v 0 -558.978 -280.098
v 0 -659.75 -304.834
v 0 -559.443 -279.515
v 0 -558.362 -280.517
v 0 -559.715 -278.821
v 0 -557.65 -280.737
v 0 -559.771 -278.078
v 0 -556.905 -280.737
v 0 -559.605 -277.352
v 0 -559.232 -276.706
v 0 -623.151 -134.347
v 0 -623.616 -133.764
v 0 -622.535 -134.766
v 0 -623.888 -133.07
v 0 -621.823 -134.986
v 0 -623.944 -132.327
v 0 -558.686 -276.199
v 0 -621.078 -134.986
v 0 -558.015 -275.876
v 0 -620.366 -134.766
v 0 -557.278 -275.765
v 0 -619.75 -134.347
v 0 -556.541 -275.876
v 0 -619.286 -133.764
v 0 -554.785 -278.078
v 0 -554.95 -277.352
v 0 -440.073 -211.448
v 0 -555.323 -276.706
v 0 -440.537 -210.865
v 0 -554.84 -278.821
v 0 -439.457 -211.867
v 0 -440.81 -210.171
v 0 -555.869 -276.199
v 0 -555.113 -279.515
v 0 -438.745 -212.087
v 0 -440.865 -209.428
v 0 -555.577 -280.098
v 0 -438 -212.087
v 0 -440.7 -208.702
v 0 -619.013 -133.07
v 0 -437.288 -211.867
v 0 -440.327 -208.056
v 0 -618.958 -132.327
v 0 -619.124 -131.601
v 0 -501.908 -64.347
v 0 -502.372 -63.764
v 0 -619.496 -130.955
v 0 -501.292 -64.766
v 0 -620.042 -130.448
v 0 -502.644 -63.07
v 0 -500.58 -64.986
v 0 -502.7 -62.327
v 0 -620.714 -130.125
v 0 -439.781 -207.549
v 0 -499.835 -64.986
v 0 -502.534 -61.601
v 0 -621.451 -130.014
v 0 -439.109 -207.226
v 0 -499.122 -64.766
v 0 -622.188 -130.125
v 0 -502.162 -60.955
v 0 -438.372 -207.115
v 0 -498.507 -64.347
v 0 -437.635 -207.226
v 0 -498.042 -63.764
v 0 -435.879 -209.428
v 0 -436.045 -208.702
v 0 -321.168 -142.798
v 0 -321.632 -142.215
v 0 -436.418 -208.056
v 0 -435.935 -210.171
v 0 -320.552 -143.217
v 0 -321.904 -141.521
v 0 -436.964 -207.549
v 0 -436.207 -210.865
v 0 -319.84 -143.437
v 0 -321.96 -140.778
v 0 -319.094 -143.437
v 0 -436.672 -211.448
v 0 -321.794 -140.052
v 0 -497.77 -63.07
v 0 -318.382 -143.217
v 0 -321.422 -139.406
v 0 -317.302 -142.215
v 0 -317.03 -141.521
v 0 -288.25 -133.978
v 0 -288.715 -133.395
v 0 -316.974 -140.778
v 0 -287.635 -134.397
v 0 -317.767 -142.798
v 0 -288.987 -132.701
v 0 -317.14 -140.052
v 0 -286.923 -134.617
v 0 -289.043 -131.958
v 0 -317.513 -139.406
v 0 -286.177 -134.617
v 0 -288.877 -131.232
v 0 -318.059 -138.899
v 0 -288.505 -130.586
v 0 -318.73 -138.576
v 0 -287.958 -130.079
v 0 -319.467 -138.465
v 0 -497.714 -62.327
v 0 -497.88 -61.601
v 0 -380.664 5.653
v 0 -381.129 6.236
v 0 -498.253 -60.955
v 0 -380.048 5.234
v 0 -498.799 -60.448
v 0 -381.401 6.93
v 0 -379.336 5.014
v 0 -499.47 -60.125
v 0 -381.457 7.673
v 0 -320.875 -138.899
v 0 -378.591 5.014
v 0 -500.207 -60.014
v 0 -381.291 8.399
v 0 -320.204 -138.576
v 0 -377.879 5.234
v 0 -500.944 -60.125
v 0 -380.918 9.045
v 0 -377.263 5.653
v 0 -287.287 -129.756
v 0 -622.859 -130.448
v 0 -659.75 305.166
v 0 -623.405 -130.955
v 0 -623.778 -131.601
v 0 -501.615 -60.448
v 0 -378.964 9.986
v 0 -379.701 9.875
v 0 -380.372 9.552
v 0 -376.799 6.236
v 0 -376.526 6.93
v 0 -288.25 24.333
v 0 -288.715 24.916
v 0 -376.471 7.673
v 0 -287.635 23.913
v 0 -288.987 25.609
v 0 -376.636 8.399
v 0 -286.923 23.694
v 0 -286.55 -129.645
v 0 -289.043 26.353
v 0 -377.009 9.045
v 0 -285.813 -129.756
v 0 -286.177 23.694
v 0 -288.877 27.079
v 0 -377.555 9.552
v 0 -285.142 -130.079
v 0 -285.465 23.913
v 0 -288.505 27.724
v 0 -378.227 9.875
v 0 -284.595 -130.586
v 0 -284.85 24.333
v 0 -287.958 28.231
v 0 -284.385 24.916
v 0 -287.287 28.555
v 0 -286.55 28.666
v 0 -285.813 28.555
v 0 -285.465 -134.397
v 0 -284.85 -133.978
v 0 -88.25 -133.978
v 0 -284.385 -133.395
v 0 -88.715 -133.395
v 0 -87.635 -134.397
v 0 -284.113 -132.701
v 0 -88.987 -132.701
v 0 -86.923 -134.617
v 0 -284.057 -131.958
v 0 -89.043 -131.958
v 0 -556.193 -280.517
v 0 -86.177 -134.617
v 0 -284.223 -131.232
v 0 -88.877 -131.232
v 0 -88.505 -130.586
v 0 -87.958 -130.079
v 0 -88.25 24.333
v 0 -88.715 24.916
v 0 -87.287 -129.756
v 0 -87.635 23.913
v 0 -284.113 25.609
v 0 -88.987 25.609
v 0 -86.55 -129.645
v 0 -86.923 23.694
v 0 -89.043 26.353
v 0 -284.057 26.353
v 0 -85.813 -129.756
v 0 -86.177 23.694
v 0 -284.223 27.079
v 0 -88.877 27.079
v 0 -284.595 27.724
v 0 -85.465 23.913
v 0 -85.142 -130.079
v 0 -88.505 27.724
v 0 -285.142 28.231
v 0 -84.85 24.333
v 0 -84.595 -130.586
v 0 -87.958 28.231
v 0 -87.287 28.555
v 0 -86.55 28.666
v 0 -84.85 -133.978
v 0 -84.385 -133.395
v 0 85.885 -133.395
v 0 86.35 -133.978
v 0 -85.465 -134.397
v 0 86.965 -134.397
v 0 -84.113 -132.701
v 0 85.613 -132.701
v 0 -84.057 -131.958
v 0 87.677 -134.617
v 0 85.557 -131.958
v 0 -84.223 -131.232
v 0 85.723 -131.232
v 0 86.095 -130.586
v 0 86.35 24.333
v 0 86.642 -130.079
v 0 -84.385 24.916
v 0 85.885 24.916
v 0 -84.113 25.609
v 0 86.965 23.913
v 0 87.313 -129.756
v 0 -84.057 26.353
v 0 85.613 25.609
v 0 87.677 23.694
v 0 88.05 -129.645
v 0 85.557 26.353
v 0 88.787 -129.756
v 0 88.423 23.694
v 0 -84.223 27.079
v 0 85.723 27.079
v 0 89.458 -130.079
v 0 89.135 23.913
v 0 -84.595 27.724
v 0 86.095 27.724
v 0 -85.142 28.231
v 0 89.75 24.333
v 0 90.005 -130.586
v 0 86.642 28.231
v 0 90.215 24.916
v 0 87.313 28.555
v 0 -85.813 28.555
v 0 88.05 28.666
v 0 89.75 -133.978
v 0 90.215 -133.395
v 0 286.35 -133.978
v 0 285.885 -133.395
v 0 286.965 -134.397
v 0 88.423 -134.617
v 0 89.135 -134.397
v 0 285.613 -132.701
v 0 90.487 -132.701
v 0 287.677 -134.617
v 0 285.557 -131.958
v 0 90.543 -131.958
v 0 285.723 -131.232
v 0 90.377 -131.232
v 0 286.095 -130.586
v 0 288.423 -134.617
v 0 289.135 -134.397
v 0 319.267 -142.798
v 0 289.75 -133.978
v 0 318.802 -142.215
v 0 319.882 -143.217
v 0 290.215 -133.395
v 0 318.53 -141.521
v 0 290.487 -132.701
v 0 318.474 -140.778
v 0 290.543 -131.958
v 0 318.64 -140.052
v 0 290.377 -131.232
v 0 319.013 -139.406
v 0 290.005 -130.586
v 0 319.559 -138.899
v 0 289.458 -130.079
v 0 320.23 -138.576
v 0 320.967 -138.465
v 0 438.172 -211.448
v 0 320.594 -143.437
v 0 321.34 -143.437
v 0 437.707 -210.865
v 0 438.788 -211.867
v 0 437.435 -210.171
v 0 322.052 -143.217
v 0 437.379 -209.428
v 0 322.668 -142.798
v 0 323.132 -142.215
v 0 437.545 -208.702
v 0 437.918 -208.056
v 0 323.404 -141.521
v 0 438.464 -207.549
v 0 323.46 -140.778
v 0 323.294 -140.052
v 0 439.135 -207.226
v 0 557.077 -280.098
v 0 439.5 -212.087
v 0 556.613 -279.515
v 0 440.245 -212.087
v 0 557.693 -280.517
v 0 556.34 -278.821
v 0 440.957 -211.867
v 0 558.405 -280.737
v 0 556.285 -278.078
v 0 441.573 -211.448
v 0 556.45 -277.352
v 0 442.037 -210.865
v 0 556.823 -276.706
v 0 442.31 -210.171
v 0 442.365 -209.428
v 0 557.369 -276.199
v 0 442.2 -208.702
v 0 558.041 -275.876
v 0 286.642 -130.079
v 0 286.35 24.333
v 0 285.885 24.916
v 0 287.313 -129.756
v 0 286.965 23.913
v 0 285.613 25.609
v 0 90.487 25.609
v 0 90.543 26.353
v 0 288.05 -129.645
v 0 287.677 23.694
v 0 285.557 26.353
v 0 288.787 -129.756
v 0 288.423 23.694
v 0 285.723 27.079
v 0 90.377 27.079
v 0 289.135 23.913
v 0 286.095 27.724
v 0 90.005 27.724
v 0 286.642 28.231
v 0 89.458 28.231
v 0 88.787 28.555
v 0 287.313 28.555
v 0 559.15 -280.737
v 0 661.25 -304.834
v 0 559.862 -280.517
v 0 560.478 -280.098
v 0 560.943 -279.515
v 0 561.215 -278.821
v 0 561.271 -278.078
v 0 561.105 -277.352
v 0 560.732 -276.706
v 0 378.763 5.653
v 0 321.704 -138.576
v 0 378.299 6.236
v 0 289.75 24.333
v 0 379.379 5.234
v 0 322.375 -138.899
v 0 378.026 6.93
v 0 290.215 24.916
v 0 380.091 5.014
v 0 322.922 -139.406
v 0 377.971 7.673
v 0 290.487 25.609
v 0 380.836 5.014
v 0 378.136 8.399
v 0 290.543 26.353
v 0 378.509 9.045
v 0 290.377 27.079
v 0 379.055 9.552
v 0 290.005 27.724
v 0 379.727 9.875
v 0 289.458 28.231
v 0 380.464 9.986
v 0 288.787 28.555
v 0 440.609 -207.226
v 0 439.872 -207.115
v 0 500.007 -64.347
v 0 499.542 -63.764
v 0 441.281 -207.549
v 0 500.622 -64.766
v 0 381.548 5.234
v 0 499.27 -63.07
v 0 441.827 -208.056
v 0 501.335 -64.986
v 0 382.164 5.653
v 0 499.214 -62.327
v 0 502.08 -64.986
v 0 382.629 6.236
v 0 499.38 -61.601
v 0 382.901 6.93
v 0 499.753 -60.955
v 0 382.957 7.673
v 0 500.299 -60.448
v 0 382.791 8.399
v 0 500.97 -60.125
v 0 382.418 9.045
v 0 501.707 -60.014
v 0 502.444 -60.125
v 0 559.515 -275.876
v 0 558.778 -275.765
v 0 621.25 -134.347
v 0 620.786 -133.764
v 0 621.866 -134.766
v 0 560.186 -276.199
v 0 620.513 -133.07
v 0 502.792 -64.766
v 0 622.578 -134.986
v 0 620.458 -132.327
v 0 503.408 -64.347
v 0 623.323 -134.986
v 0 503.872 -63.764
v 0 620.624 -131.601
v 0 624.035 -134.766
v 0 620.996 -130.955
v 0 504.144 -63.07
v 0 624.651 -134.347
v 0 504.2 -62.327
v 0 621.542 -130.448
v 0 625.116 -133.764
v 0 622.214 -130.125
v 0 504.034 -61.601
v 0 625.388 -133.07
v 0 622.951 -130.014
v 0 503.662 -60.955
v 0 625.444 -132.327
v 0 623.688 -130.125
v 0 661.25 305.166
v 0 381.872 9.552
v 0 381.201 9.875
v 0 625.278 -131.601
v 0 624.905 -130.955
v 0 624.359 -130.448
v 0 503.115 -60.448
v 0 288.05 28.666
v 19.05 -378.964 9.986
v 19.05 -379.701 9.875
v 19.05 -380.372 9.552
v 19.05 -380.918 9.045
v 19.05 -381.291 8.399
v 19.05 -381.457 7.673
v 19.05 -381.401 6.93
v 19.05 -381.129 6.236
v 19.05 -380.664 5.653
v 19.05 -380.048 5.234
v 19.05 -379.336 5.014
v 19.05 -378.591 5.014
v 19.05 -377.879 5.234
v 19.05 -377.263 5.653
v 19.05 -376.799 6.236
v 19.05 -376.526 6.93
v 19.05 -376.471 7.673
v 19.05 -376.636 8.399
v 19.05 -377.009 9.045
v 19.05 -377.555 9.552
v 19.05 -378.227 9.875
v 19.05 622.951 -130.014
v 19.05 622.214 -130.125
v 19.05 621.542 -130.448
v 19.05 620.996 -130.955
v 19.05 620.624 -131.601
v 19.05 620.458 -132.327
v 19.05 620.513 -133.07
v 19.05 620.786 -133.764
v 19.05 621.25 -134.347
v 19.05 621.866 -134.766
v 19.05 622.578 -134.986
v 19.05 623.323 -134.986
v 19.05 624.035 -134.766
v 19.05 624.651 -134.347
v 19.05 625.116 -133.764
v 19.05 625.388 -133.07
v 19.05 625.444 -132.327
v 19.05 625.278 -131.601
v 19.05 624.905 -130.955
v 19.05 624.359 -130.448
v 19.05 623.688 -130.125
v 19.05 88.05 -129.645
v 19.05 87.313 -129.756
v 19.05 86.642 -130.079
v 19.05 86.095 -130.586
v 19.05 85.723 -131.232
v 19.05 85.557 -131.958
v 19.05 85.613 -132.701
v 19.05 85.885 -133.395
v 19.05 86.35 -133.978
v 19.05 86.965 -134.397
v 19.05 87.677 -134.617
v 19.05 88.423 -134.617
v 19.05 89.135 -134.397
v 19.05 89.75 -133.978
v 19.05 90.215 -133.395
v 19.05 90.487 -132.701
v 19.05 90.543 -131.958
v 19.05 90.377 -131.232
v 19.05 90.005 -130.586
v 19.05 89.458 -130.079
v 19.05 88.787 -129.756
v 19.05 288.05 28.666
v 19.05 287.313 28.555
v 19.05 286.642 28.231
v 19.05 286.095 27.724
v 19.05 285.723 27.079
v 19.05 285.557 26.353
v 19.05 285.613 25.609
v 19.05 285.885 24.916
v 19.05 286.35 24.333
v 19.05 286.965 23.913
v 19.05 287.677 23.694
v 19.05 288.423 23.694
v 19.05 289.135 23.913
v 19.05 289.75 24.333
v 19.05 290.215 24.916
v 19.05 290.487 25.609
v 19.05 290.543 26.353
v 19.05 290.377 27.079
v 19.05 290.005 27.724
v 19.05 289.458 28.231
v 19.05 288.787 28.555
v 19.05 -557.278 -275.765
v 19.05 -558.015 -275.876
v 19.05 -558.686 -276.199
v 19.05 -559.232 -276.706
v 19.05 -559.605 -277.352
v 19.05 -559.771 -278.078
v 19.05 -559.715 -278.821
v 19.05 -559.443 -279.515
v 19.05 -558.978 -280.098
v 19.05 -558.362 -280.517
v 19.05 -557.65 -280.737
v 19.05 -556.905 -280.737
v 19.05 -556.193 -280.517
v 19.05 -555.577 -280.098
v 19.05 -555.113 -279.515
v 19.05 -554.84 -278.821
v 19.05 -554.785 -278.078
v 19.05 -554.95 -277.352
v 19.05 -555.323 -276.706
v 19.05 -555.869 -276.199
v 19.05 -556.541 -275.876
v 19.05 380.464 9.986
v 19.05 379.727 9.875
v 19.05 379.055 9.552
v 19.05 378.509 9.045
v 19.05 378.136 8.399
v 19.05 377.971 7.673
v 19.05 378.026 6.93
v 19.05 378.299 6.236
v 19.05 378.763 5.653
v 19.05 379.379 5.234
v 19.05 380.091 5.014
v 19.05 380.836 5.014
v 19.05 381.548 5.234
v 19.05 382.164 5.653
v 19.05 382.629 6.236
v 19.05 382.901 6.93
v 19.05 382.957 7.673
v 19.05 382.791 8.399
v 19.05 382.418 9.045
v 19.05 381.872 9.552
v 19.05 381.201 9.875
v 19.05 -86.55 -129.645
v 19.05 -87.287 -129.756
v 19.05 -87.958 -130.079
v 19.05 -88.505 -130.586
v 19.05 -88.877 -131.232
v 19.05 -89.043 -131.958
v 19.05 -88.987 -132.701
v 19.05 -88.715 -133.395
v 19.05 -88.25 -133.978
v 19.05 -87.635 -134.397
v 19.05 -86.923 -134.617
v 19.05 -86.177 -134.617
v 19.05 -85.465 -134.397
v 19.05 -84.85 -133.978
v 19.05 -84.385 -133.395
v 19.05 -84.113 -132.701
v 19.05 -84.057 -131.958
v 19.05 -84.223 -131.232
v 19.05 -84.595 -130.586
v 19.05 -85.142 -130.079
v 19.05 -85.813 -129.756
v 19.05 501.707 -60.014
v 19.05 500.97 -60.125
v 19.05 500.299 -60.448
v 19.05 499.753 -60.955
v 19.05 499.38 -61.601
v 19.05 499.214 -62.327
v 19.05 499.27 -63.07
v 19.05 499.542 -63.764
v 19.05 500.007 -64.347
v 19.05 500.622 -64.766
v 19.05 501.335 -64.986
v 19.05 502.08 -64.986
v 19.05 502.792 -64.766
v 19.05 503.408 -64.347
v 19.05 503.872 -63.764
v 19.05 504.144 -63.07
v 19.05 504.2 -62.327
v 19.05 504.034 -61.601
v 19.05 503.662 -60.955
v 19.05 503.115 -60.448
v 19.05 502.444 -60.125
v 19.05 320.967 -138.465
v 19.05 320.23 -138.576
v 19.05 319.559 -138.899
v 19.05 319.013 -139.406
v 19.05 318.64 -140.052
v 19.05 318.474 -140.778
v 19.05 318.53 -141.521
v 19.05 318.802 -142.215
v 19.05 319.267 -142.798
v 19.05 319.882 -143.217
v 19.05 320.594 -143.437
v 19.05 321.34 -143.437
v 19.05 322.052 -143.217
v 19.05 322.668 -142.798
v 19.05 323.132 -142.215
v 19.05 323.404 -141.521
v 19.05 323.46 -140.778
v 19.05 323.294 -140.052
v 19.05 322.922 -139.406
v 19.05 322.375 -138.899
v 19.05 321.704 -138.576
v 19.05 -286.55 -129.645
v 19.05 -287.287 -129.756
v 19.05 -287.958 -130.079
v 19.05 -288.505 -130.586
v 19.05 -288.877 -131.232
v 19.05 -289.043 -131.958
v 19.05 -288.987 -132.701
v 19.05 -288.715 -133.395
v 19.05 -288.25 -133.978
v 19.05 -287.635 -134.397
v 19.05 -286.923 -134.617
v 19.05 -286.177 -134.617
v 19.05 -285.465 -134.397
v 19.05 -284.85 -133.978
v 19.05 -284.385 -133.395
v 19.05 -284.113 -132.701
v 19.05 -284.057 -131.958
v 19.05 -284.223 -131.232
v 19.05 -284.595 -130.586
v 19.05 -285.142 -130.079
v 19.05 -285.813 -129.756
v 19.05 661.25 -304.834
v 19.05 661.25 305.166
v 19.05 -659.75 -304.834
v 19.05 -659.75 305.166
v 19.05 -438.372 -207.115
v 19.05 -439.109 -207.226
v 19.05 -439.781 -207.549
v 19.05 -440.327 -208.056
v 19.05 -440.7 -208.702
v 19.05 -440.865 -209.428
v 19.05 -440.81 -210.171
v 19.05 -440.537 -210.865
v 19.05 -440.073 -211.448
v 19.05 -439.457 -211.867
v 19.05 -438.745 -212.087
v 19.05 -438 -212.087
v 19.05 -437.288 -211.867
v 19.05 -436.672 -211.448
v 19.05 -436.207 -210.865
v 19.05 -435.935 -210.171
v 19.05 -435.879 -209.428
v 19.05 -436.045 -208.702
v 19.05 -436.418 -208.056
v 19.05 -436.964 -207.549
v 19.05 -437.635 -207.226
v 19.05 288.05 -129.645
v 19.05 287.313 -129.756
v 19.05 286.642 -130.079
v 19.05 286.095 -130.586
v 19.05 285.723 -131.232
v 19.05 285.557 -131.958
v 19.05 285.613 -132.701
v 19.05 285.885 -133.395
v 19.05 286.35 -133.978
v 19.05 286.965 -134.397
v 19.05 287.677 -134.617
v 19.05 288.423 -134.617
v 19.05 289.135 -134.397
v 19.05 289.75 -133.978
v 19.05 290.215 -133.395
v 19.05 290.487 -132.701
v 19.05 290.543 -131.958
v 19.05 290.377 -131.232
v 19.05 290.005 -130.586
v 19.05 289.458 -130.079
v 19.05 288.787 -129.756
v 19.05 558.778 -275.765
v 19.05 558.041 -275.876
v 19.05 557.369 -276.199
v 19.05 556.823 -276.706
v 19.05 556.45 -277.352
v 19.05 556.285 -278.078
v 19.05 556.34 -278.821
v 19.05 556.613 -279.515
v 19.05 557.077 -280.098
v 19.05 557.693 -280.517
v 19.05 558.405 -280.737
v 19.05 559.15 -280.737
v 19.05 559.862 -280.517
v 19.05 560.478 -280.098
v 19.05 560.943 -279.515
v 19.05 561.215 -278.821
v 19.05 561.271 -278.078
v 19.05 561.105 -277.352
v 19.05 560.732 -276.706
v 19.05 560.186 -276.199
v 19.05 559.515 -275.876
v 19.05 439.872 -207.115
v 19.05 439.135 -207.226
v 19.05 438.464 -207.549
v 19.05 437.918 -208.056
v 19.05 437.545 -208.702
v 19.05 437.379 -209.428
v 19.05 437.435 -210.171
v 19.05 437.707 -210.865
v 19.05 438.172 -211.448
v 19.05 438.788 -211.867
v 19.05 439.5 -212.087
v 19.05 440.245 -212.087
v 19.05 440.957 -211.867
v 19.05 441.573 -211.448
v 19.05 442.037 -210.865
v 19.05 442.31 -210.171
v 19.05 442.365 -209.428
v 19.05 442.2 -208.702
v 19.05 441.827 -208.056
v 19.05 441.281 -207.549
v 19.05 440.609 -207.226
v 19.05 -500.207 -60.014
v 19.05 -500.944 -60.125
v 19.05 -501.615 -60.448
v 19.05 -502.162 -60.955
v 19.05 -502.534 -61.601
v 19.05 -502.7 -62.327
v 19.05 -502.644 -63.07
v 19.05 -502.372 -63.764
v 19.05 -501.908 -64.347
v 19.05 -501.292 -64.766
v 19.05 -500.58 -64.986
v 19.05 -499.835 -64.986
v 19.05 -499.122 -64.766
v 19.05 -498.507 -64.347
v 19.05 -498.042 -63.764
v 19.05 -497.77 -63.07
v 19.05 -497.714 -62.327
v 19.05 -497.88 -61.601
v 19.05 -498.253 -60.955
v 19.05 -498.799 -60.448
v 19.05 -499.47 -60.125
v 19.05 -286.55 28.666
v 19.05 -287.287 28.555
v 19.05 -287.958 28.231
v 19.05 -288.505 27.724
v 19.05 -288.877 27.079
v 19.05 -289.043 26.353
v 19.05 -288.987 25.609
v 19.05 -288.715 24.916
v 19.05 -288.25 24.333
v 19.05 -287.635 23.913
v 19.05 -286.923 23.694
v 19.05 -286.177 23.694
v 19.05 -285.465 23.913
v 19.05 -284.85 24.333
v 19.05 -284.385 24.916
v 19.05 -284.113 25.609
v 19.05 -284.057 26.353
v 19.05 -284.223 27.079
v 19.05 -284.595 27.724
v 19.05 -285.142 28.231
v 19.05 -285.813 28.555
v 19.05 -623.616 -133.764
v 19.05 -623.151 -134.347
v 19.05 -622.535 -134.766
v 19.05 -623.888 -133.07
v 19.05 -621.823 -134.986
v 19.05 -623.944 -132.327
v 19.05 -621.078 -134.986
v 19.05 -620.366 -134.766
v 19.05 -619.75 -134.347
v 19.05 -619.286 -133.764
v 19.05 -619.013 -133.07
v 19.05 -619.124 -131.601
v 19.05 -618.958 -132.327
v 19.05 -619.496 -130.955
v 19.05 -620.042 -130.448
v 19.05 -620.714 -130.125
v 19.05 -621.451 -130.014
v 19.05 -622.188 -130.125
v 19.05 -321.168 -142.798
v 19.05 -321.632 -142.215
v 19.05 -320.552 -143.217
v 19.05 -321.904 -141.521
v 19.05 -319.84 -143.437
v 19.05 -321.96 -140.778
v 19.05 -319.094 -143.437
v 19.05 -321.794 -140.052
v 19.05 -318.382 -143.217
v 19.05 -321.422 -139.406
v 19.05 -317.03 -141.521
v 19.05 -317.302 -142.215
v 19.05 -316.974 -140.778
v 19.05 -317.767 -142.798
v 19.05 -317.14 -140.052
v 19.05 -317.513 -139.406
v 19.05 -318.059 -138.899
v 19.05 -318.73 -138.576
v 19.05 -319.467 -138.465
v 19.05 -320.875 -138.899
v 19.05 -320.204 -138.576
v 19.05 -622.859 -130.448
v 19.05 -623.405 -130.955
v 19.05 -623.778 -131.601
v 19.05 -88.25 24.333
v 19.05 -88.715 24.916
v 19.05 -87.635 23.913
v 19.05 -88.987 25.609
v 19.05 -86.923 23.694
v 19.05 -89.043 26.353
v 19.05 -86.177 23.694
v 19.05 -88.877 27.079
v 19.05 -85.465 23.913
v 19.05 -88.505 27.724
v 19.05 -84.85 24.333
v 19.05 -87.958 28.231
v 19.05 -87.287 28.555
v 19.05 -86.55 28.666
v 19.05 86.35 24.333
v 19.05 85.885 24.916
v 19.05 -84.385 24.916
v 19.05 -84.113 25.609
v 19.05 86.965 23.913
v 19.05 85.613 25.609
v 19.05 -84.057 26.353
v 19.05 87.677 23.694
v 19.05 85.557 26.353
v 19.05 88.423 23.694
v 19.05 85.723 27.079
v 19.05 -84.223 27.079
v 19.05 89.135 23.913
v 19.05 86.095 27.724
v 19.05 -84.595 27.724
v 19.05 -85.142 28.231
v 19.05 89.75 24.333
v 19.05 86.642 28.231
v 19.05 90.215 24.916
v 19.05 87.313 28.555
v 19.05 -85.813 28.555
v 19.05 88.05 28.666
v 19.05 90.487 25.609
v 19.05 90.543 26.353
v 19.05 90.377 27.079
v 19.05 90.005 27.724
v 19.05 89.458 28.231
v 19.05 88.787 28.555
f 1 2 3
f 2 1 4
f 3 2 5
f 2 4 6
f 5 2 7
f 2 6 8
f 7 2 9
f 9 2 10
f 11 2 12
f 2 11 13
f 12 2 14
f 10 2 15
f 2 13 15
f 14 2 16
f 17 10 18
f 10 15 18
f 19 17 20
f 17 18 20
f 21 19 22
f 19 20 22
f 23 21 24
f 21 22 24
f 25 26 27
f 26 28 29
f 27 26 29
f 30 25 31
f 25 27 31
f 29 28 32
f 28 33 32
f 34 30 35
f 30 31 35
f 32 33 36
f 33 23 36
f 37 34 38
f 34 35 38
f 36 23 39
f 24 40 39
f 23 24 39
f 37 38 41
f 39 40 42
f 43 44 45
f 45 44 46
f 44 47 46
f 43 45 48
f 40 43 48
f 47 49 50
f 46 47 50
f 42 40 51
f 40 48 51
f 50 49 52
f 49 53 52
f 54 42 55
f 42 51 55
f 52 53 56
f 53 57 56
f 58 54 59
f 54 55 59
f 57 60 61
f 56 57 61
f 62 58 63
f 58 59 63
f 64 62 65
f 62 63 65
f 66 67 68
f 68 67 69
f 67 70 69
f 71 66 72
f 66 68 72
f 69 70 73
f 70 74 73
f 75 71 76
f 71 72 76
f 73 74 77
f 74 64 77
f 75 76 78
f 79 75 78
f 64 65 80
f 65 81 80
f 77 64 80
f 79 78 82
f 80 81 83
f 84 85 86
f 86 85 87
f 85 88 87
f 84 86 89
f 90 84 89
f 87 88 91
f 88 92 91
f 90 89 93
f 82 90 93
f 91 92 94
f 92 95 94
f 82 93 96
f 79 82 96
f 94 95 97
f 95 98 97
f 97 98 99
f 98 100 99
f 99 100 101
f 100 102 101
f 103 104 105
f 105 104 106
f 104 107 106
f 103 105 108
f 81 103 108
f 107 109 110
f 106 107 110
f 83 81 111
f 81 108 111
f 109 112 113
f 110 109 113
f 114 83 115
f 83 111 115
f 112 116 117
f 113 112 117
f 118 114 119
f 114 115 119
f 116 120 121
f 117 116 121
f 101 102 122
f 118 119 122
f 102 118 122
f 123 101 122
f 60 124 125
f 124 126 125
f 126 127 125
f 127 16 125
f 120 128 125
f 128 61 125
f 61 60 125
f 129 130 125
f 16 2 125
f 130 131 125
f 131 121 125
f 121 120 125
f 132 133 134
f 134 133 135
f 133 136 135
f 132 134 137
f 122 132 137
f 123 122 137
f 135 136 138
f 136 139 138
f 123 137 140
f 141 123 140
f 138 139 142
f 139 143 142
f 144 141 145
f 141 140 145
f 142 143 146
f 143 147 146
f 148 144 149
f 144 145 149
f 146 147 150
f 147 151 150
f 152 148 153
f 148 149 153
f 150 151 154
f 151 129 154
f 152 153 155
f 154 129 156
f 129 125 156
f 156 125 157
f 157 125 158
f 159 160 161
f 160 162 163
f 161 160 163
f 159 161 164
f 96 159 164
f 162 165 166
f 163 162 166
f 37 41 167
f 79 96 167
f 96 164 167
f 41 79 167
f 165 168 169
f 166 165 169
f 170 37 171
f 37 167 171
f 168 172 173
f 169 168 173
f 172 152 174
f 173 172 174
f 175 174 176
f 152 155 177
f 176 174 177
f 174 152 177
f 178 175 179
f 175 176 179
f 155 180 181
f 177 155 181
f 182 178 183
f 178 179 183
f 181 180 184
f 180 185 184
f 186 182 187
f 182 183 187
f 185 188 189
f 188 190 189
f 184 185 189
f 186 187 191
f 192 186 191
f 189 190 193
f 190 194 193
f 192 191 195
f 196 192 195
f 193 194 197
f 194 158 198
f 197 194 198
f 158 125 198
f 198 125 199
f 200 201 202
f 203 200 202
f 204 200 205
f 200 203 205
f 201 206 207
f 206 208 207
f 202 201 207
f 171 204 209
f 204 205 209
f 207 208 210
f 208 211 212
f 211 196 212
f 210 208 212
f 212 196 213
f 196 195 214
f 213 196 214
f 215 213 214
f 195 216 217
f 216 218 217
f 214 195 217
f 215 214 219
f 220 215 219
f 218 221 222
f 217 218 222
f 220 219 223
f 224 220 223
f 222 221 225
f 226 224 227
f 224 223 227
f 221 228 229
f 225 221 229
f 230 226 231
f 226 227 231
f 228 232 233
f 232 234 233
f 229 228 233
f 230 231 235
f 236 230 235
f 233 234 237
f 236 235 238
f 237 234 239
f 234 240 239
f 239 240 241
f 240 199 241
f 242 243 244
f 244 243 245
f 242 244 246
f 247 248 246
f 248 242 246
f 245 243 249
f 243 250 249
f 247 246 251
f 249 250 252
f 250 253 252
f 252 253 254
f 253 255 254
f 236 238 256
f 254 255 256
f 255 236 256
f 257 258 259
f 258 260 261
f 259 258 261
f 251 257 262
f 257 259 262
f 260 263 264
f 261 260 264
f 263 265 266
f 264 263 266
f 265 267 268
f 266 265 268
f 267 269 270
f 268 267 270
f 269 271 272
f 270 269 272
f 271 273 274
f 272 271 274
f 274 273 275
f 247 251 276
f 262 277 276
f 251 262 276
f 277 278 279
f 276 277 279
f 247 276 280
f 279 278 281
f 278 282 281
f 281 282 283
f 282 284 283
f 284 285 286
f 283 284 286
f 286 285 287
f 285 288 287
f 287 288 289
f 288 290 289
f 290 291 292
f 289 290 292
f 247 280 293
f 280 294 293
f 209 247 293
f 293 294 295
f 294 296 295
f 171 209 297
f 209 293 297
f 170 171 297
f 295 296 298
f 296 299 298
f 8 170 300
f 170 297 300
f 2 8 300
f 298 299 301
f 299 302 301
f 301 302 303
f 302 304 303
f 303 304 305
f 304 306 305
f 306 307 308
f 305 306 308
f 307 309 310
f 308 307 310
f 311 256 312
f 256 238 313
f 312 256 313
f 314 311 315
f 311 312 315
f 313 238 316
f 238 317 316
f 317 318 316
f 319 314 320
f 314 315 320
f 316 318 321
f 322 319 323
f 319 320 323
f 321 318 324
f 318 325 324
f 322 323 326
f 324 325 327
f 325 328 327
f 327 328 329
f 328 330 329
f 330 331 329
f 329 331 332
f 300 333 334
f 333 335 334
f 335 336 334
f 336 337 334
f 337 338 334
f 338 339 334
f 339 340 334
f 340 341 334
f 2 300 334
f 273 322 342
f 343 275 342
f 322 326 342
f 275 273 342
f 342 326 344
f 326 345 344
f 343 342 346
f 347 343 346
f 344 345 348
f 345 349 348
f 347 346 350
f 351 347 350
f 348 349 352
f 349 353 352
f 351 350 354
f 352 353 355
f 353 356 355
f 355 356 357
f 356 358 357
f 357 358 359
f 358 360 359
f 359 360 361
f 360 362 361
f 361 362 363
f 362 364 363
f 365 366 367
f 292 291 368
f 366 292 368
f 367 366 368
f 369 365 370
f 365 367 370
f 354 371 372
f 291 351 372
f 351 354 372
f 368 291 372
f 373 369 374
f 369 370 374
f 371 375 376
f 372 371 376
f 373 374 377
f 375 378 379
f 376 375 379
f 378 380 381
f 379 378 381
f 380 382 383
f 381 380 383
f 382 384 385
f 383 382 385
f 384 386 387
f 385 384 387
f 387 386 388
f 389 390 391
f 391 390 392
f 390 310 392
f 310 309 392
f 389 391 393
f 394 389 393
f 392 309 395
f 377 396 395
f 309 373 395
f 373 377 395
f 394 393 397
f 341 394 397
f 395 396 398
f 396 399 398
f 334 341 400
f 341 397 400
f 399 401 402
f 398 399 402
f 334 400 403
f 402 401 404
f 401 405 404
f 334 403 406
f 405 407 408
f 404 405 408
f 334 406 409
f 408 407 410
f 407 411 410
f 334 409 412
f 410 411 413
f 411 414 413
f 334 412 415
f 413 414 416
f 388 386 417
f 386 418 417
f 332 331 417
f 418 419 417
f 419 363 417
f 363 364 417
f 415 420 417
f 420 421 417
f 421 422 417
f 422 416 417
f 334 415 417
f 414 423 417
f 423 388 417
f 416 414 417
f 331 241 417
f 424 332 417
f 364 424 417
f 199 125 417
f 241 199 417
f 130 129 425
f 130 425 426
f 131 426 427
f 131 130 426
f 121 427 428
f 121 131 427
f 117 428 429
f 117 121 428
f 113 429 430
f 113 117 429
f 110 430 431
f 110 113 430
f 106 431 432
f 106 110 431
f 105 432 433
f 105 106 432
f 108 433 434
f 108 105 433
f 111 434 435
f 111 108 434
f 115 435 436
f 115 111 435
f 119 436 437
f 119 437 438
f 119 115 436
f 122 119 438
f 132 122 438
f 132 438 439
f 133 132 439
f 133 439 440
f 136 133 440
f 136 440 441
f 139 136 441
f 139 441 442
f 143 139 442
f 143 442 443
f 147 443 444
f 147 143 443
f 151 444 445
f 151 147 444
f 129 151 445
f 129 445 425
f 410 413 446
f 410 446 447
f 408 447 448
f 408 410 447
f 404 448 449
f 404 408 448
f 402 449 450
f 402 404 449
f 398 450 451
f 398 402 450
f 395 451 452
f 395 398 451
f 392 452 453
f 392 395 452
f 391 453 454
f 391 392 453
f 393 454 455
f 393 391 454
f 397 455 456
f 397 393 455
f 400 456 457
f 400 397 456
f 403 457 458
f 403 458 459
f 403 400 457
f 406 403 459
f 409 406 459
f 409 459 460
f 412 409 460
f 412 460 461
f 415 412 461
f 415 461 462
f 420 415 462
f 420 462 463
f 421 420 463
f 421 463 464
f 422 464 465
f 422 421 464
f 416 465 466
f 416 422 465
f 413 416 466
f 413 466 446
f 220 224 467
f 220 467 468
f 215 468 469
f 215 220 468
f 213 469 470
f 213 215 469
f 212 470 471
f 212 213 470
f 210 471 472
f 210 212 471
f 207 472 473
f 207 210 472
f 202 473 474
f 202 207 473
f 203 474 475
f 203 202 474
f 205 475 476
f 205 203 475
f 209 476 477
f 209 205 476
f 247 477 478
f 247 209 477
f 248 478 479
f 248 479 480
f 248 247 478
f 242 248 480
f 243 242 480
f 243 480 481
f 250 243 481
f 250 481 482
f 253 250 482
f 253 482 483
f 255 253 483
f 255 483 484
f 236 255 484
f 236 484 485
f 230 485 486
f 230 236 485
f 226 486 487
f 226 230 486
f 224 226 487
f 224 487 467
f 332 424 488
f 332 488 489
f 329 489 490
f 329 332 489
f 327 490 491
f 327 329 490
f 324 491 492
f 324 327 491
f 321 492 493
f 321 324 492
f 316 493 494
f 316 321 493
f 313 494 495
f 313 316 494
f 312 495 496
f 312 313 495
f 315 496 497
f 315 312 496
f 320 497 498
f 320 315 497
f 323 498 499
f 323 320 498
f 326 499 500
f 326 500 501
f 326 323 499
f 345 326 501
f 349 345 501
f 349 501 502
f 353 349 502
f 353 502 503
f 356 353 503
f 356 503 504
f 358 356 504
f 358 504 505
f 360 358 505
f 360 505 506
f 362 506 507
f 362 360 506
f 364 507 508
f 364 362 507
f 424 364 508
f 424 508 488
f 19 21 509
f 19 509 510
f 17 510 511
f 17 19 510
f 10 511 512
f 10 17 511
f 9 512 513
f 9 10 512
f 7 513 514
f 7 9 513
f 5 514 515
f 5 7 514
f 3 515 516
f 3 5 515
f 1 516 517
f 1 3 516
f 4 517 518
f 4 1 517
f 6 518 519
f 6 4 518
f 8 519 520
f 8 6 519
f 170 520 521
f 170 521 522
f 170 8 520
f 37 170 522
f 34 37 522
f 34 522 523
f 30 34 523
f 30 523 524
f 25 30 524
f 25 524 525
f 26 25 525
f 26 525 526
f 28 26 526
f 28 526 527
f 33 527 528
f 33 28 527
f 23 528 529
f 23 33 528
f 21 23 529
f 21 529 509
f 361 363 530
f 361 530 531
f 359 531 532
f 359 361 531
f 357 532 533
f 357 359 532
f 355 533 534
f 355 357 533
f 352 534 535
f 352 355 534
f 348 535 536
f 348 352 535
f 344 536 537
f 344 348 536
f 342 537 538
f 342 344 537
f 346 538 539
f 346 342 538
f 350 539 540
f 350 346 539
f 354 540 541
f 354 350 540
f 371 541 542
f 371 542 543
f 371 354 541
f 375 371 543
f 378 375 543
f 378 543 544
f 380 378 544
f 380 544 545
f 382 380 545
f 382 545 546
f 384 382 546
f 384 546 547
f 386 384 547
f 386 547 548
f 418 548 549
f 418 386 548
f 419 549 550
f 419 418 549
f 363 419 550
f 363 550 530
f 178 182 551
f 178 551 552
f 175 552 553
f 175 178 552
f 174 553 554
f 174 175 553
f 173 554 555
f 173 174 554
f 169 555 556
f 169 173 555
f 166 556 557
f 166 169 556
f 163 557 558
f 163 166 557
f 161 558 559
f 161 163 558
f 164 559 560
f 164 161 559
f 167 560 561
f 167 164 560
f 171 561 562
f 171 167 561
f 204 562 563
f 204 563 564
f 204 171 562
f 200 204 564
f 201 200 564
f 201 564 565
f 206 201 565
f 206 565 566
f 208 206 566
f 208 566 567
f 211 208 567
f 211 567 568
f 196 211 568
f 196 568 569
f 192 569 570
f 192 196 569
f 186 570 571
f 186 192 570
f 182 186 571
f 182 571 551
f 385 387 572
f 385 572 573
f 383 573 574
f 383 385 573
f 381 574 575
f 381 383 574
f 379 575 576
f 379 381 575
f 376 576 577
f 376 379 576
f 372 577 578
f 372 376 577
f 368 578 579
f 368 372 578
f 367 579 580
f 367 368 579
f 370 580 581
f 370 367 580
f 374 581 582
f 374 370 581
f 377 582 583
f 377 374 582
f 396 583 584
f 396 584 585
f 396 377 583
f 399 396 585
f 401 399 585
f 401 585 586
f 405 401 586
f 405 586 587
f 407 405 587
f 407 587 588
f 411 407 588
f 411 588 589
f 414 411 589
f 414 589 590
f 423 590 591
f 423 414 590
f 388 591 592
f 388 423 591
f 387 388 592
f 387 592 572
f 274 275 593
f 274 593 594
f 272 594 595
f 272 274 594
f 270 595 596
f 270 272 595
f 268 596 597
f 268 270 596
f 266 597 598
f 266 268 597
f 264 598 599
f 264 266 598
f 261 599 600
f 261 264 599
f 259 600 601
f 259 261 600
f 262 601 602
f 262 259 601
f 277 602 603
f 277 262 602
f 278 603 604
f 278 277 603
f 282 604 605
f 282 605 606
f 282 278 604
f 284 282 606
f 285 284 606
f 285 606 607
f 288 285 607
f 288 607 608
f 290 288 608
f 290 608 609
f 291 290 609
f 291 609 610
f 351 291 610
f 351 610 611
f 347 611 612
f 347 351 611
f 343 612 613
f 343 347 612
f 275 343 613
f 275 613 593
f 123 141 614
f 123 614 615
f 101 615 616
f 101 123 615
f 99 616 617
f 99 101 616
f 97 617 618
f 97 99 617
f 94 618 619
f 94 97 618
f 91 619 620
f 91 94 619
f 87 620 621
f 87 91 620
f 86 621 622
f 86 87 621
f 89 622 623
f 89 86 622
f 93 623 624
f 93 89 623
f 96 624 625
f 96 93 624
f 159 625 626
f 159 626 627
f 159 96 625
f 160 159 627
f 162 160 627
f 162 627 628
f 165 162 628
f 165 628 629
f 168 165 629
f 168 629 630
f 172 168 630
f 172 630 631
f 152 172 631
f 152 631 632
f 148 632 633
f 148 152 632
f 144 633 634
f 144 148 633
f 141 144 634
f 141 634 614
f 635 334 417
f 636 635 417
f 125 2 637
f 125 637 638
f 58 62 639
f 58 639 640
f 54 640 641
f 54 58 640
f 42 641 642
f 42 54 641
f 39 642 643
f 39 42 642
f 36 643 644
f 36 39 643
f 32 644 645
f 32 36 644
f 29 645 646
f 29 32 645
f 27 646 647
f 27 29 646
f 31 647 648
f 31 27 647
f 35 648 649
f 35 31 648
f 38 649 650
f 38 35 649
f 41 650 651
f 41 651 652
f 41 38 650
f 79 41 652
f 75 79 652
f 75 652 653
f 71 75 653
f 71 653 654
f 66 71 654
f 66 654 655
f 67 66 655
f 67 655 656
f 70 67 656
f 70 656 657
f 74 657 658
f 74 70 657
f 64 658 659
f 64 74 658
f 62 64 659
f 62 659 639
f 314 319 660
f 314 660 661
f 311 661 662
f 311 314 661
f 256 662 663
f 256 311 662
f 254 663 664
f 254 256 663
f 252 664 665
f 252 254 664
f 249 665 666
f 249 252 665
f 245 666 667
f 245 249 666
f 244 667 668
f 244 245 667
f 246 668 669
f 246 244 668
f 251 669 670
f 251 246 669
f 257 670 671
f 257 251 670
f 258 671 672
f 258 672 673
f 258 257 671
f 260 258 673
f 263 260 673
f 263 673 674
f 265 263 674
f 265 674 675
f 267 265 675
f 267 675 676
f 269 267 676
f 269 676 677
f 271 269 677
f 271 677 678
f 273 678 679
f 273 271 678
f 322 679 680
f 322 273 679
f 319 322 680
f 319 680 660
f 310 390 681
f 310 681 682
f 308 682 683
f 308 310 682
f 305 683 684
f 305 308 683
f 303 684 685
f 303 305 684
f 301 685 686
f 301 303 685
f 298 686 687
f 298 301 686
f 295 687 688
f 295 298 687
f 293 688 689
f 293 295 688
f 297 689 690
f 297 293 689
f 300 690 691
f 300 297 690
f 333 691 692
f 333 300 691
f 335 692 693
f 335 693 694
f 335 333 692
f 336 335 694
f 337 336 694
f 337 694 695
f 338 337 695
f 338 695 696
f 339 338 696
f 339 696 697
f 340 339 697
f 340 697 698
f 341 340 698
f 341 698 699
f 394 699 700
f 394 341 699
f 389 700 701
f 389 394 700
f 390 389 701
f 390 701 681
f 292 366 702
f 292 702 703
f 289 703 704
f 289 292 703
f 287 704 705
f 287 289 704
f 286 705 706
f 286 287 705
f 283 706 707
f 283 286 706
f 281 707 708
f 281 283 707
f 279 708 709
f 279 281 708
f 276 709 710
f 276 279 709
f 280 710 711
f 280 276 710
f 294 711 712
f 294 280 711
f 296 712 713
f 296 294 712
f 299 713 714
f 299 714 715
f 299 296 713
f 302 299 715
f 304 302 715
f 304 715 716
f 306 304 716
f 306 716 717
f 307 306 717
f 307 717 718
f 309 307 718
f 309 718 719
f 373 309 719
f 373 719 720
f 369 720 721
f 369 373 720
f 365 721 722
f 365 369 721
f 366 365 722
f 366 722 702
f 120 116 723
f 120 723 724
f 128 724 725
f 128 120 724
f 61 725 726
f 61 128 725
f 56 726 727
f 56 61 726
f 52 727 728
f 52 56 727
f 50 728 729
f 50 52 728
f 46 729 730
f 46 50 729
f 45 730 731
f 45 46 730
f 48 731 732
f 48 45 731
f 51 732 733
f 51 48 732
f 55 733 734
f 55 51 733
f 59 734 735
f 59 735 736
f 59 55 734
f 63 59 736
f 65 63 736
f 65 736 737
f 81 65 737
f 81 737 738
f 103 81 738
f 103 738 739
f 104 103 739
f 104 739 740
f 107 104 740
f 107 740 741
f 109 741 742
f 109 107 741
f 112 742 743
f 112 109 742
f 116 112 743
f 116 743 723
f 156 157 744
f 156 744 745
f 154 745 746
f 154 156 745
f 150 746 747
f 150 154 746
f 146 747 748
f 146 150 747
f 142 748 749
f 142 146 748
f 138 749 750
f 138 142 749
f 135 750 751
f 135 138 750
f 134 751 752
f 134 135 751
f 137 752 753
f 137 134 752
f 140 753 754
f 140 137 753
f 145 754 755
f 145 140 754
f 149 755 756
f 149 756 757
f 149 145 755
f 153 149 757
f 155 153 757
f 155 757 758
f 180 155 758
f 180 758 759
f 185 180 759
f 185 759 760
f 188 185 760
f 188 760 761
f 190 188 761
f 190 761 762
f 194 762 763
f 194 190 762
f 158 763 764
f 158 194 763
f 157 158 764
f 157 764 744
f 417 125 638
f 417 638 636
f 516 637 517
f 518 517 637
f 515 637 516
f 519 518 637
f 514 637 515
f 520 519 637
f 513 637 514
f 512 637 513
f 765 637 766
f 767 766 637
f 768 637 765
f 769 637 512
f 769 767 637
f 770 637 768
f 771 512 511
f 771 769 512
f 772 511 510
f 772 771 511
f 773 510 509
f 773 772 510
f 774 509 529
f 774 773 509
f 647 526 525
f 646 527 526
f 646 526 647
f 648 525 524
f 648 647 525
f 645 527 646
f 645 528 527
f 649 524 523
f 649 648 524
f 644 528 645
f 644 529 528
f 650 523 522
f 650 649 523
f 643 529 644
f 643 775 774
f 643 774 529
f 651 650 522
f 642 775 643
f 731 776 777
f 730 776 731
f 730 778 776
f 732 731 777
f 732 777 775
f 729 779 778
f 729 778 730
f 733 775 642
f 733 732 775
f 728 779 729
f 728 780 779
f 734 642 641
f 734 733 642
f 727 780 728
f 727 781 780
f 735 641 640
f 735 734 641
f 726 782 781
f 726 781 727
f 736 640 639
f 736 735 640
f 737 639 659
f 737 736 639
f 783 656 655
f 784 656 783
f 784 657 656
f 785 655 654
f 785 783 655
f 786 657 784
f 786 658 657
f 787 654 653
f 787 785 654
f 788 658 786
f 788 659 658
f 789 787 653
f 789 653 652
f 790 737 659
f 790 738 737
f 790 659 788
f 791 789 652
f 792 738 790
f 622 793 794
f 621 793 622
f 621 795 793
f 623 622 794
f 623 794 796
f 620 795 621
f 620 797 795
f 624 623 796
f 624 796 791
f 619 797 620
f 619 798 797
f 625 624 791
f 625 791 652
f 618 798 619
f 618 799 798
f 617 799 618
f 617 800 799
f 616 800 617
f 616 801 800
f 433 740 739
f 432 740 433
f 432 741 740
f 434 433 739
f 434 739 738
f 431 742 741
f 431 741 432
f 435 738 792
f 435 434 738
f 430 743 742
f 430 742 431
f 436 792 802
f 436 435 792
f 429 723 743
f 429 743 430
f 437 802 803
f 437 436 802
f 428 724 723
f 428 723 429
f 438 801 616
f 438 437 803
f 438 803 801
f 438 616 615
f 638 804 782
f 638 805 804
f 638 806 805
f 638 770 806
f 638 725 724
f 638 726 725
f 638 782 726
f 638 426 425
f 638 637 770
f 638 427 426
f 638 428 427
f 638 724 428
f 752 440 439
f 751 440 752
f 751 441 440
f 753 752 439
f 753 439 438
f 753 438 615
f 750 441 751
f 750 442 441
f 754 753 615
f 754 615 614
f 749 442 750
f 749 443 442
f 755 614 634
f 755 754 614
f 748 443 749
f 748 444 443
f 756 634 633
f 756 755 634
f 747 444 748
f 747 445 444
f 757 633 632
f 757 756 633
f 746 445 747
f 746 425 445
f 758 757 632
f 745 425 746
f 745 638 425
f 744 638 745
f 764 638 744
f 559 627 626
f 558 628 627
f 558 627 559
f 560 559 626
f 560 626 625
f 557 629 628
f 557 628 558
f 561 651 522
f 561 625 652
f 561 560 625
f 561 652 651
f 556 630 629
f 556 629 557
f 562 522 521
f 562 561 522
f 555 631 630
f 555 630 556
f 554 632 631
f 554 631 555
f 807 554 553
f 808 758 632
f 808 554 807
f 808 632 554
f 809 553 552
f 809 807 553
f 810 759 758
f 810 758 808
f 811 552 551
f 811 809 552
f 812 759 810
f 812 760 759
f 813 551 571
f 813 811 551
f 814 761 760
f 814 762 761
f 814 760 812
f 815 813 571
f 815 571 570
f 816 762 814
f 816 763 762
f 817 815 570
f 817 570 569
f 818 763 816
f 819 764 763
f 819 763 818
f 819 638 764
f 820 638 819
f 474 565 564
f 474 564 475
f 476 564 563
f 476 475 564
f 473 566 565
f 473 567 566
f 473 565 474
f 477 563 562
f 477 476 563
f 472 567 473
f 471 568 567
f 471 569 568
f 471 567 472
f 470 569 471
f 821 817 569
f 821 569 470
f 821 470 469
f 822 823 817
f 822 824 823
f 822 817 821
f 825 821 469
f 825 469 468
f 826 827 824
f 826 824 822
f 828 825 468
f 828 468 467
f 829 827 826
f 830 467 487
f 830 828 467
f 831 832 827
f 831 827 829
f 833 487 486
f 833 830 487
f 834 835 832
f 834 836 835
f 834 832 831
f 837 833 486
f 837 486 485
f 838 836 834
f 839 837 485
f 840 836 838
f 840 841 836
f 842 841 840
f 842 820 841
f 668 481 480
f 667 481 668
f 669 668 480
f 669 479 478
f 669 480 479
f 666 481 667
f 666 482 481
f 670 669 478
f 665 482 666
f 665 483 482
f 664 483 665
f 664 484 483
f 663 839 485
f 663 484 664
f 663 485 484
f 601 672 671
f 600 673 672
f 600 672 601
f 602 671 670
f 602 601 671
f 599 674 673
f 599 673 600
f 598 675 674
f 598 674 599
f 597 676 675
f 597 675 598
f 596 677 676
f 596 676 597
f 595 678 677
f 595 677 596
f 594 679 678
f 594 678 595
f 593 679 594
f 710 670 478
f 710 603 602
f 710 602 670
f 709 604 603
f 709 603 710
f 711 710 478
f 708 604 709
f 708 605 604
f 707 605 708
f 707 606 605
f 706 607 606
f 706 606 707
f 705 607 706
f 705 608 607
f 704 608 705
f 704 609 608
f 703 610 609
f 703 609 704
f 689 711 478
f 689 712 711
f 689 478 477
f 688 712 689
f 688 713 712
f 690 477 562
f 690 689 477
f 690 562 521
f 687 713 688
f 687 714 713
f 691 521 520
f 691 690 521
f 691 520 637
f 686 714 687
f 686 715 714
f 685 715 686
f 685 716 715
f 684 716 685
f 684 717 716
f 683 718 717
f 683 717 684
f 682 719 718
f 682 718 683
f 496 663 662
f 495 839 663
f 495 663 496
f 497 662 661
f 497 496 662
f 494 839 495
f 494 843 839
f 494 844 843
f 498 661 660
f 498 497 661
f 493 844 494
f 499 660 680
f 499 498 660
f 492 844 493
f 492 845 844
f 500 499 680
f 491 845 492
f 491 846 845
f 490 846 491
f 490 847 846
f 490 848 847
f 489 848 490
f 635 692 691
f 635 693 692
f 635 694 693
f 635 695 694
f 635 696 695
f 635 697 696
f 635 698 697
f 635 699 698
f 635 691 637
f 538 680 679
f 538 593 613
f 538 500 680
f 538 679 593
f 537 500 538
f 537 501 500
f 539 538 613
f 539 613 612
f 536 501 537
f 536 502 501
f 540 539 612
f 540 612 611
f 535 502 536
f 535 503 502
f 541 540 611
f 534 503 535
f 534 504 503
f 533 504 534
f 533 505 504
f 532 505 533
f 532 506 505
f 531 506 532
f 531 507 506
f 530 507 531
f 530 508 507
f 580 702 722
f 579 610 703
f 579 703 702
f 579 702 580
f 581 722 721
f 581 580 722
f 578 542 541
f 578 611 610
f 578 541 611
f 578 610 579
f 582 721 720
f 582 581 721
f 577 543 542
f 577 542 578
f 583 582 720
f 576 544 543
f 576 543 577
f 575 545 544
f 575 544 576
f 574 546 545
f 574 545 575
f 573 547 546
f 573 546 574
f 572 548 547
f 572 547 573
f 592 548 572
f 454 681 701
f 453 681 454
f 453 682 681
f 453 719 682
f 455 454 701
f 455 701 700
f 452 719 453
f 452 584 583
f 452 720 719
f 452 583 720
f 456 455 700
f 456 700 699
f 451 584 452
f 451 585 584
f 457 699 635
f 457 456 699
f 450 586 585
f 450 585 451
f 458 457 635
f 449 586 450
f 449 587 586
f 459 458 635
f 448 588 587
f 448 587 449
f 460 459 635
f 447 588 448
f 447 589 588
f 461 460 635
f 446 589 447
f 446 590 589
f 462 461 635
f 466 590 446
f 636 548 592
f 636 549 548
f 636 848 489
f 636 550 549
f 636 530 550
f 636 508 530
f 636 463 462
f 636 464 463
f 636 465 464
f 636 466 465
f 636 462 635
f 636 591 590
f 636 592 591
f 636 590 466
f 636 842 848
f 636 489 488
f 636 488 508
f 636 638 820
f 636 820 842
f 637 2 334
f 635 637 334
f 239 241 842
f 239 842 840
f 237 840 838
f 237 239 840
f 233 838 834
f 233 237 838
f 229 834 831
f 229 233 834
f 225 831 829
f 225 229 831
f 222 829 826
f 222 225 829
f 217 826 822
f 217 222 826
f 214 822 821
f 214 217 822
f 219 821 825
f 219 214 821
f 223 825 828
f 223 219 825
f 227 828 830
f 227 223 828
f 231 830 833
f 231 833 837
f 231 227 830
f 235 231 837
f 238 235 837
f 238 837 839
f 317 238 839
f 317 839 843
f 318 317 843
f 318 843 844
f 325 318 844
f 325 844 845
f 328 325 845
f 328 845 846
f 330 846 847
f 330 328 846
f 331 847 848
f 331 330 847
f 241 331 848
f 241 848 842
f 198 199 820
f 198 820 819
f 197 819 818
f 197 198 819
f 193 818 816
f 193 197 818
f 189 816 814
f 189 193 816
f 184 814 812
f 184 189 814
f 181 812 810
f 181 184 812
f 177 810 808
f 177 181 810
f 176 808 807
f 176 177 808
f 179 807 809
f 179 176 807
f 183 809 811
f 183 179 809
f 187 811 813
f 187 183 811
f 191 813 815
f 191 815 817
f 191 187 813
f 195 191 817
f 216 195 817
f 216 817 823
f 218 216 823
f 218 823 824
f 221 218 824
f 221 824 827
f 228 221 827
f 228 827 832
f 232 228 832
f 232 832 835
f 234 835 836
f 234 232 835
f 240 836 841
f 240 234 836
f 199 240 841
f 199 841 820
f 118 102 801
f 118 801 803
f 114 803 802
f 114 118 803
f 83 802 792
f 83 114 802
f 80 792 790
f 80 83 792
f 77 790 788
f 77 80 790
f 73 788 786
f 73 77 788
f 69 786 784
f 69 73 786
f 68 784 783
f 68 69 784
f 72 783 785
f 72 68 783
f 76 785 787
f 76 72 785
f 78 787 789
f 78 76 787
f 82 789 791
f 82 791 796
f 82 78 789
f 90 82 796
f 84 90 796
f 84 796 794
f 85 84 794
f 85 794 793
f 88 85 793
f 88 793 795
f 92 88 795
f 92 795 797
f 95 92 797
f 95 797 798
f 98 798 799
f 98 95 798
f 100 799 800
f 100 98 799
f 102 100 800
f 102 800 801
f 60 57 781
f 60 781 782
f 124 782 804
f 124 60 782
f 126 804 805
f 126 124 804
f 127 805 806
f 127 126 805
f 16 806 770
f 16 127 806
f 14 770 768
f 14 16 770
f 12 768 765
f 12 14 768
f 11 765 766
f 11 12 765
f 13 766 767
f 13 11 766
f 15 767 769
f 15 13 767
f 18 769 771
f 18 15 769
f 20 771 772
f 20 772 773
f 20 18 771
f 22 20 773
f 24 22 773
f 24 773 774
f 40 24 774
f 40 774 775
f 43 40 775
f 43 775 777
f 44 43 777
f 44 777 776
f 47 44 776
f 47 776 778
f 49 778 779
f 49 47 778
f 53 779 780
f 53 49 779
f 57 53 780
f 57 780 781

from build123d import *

# Parameters (mm, degrees)
SKETCH2_W           = 1321
SKETCH2_H           = 610
SKETCH2_R           = 2.5
BOSS_EXTRUDE1_DEPTH = 19.05


with BuildPart() as part:
    # Sketch2 → Boss-Extrude1 (new body)
    with BuildSketch(Plane.YZ):
        with Locations((0.75, 0.165708265)):
            Rectangle(SKETCH2_W, SKETCH2_H)
        with Locations(Location((558.77766677, -278.265003699, 0), (0, 0, 90))):
            Circle(SKETCH2_R, mode=Mode.SUBTRACT)
        with Locations(Location((439.87237883, -209.615003699, 0), (0, 0, 90))):
            Circle(SKETCH2_R, mode=Mode.SUBTRACT)
        with Locations(Location((320.967090891, -140.965003699, 0), (0, 0, 90))):
            Circle(SKETCH2_R, mode=Mode.SUBTRACT)
        with Locations(Location((622.950729306, -132.51399891, 0), (0, 0, 90))):
            Circle(SKETCH2_R, mode=Mode.SUBTRACT)
        with Locations(Location((501.707172776, -62.51399891, 0), (0, 0, 90))):
            Circle(SKETCH2_R, mode=Mode.SUBTRACT)
        with Locations(Location((380.463616246, 7.48600109, 0), (0, 0, 90))):
            Circle(SKETCH2_R, mode=Mode.SUBTRACT)
        with Locations(Location((288.05, 26.165708265, 0), (0, 0, 90))):
            Circle(SKETCH2_R, mode=Mode.SUBTRACT)
        with Locations(Location((288.05, -132.144895778, 0), (0, 0, 90))):
            Circle(SKETCH2_R, mode=Mode.SUBTRACT)
        with Locations(Location((88.05, -132.144895778, 0), (0, 0, 90))):
            Circle(SKETCH2_R, mode=Mode.SUBTRACT)
        with Locations(Location((88.05, 26.165708265, 0), (0, 0, 90))):
            Circle(SKETCH2_R, mode=Mode.SUBTRACT)
        with Locations(Location((-86.55, -132.144895778, 0), (0, 0, 90))):
            Circle(SKETCH2_R, mode=Mode.SUBTRACT)
        with Locations(Location((-86.55, 26.165708265, 0), (0, 0, 90))):
            Circle(SKETCH2_R, mode=Mode.SUBTRACT)
        with Locations(Location((-286.55, 26.165708265, 0), (0, 0, 90))):
            Circle(SKETCH2_R, mode=Mode.SUBTRACT)
        with Locations(Location((-286.55, -132.144895778, 0), (0, 0, 90))):
            Circle(SKETCH2_R, mode=Mode.SUBTRACT)
        with Locations(Location((-557.27766677, -278.265003699, 0), (0, 0, 90))):
            Circle(SKETCH2_R, mode=Mode.SUBTRACT)
        with Locations(Location((-438.37237883, -209.615003699, 0), (0, 0, 90))):
            Circle(SKETCH2_R, mode=Mode.SUBTRACT)
        with Locations(Location((-319.467090891, -140.965003699, 0), (0, 0, 90))):
            Circle(SKETCH2_R, mode=Mode.SUBTRACT)
        with Locations(Location((-378.963616246, 7.48600109, 0), (0, 0, 90))):
            Circle(SKETCH2_R, mode=Mode.SUBTRACT)
        with Locations(Location((-500.207172776, -62.51399891, 0), (0, 0, 90))):
            Circle(SKETCH2_R, mode=Mode.SUBTRACT)
        with Locations(Location((-621.450729306, -132.51399891, 0), (0, 0, 90))):
            Circle(SKETCH2_R, mode=Mode.SUBTRACT)
    extrude(amount=BOSS_EXTRUDE1_DEPTH)


solid = part.part
